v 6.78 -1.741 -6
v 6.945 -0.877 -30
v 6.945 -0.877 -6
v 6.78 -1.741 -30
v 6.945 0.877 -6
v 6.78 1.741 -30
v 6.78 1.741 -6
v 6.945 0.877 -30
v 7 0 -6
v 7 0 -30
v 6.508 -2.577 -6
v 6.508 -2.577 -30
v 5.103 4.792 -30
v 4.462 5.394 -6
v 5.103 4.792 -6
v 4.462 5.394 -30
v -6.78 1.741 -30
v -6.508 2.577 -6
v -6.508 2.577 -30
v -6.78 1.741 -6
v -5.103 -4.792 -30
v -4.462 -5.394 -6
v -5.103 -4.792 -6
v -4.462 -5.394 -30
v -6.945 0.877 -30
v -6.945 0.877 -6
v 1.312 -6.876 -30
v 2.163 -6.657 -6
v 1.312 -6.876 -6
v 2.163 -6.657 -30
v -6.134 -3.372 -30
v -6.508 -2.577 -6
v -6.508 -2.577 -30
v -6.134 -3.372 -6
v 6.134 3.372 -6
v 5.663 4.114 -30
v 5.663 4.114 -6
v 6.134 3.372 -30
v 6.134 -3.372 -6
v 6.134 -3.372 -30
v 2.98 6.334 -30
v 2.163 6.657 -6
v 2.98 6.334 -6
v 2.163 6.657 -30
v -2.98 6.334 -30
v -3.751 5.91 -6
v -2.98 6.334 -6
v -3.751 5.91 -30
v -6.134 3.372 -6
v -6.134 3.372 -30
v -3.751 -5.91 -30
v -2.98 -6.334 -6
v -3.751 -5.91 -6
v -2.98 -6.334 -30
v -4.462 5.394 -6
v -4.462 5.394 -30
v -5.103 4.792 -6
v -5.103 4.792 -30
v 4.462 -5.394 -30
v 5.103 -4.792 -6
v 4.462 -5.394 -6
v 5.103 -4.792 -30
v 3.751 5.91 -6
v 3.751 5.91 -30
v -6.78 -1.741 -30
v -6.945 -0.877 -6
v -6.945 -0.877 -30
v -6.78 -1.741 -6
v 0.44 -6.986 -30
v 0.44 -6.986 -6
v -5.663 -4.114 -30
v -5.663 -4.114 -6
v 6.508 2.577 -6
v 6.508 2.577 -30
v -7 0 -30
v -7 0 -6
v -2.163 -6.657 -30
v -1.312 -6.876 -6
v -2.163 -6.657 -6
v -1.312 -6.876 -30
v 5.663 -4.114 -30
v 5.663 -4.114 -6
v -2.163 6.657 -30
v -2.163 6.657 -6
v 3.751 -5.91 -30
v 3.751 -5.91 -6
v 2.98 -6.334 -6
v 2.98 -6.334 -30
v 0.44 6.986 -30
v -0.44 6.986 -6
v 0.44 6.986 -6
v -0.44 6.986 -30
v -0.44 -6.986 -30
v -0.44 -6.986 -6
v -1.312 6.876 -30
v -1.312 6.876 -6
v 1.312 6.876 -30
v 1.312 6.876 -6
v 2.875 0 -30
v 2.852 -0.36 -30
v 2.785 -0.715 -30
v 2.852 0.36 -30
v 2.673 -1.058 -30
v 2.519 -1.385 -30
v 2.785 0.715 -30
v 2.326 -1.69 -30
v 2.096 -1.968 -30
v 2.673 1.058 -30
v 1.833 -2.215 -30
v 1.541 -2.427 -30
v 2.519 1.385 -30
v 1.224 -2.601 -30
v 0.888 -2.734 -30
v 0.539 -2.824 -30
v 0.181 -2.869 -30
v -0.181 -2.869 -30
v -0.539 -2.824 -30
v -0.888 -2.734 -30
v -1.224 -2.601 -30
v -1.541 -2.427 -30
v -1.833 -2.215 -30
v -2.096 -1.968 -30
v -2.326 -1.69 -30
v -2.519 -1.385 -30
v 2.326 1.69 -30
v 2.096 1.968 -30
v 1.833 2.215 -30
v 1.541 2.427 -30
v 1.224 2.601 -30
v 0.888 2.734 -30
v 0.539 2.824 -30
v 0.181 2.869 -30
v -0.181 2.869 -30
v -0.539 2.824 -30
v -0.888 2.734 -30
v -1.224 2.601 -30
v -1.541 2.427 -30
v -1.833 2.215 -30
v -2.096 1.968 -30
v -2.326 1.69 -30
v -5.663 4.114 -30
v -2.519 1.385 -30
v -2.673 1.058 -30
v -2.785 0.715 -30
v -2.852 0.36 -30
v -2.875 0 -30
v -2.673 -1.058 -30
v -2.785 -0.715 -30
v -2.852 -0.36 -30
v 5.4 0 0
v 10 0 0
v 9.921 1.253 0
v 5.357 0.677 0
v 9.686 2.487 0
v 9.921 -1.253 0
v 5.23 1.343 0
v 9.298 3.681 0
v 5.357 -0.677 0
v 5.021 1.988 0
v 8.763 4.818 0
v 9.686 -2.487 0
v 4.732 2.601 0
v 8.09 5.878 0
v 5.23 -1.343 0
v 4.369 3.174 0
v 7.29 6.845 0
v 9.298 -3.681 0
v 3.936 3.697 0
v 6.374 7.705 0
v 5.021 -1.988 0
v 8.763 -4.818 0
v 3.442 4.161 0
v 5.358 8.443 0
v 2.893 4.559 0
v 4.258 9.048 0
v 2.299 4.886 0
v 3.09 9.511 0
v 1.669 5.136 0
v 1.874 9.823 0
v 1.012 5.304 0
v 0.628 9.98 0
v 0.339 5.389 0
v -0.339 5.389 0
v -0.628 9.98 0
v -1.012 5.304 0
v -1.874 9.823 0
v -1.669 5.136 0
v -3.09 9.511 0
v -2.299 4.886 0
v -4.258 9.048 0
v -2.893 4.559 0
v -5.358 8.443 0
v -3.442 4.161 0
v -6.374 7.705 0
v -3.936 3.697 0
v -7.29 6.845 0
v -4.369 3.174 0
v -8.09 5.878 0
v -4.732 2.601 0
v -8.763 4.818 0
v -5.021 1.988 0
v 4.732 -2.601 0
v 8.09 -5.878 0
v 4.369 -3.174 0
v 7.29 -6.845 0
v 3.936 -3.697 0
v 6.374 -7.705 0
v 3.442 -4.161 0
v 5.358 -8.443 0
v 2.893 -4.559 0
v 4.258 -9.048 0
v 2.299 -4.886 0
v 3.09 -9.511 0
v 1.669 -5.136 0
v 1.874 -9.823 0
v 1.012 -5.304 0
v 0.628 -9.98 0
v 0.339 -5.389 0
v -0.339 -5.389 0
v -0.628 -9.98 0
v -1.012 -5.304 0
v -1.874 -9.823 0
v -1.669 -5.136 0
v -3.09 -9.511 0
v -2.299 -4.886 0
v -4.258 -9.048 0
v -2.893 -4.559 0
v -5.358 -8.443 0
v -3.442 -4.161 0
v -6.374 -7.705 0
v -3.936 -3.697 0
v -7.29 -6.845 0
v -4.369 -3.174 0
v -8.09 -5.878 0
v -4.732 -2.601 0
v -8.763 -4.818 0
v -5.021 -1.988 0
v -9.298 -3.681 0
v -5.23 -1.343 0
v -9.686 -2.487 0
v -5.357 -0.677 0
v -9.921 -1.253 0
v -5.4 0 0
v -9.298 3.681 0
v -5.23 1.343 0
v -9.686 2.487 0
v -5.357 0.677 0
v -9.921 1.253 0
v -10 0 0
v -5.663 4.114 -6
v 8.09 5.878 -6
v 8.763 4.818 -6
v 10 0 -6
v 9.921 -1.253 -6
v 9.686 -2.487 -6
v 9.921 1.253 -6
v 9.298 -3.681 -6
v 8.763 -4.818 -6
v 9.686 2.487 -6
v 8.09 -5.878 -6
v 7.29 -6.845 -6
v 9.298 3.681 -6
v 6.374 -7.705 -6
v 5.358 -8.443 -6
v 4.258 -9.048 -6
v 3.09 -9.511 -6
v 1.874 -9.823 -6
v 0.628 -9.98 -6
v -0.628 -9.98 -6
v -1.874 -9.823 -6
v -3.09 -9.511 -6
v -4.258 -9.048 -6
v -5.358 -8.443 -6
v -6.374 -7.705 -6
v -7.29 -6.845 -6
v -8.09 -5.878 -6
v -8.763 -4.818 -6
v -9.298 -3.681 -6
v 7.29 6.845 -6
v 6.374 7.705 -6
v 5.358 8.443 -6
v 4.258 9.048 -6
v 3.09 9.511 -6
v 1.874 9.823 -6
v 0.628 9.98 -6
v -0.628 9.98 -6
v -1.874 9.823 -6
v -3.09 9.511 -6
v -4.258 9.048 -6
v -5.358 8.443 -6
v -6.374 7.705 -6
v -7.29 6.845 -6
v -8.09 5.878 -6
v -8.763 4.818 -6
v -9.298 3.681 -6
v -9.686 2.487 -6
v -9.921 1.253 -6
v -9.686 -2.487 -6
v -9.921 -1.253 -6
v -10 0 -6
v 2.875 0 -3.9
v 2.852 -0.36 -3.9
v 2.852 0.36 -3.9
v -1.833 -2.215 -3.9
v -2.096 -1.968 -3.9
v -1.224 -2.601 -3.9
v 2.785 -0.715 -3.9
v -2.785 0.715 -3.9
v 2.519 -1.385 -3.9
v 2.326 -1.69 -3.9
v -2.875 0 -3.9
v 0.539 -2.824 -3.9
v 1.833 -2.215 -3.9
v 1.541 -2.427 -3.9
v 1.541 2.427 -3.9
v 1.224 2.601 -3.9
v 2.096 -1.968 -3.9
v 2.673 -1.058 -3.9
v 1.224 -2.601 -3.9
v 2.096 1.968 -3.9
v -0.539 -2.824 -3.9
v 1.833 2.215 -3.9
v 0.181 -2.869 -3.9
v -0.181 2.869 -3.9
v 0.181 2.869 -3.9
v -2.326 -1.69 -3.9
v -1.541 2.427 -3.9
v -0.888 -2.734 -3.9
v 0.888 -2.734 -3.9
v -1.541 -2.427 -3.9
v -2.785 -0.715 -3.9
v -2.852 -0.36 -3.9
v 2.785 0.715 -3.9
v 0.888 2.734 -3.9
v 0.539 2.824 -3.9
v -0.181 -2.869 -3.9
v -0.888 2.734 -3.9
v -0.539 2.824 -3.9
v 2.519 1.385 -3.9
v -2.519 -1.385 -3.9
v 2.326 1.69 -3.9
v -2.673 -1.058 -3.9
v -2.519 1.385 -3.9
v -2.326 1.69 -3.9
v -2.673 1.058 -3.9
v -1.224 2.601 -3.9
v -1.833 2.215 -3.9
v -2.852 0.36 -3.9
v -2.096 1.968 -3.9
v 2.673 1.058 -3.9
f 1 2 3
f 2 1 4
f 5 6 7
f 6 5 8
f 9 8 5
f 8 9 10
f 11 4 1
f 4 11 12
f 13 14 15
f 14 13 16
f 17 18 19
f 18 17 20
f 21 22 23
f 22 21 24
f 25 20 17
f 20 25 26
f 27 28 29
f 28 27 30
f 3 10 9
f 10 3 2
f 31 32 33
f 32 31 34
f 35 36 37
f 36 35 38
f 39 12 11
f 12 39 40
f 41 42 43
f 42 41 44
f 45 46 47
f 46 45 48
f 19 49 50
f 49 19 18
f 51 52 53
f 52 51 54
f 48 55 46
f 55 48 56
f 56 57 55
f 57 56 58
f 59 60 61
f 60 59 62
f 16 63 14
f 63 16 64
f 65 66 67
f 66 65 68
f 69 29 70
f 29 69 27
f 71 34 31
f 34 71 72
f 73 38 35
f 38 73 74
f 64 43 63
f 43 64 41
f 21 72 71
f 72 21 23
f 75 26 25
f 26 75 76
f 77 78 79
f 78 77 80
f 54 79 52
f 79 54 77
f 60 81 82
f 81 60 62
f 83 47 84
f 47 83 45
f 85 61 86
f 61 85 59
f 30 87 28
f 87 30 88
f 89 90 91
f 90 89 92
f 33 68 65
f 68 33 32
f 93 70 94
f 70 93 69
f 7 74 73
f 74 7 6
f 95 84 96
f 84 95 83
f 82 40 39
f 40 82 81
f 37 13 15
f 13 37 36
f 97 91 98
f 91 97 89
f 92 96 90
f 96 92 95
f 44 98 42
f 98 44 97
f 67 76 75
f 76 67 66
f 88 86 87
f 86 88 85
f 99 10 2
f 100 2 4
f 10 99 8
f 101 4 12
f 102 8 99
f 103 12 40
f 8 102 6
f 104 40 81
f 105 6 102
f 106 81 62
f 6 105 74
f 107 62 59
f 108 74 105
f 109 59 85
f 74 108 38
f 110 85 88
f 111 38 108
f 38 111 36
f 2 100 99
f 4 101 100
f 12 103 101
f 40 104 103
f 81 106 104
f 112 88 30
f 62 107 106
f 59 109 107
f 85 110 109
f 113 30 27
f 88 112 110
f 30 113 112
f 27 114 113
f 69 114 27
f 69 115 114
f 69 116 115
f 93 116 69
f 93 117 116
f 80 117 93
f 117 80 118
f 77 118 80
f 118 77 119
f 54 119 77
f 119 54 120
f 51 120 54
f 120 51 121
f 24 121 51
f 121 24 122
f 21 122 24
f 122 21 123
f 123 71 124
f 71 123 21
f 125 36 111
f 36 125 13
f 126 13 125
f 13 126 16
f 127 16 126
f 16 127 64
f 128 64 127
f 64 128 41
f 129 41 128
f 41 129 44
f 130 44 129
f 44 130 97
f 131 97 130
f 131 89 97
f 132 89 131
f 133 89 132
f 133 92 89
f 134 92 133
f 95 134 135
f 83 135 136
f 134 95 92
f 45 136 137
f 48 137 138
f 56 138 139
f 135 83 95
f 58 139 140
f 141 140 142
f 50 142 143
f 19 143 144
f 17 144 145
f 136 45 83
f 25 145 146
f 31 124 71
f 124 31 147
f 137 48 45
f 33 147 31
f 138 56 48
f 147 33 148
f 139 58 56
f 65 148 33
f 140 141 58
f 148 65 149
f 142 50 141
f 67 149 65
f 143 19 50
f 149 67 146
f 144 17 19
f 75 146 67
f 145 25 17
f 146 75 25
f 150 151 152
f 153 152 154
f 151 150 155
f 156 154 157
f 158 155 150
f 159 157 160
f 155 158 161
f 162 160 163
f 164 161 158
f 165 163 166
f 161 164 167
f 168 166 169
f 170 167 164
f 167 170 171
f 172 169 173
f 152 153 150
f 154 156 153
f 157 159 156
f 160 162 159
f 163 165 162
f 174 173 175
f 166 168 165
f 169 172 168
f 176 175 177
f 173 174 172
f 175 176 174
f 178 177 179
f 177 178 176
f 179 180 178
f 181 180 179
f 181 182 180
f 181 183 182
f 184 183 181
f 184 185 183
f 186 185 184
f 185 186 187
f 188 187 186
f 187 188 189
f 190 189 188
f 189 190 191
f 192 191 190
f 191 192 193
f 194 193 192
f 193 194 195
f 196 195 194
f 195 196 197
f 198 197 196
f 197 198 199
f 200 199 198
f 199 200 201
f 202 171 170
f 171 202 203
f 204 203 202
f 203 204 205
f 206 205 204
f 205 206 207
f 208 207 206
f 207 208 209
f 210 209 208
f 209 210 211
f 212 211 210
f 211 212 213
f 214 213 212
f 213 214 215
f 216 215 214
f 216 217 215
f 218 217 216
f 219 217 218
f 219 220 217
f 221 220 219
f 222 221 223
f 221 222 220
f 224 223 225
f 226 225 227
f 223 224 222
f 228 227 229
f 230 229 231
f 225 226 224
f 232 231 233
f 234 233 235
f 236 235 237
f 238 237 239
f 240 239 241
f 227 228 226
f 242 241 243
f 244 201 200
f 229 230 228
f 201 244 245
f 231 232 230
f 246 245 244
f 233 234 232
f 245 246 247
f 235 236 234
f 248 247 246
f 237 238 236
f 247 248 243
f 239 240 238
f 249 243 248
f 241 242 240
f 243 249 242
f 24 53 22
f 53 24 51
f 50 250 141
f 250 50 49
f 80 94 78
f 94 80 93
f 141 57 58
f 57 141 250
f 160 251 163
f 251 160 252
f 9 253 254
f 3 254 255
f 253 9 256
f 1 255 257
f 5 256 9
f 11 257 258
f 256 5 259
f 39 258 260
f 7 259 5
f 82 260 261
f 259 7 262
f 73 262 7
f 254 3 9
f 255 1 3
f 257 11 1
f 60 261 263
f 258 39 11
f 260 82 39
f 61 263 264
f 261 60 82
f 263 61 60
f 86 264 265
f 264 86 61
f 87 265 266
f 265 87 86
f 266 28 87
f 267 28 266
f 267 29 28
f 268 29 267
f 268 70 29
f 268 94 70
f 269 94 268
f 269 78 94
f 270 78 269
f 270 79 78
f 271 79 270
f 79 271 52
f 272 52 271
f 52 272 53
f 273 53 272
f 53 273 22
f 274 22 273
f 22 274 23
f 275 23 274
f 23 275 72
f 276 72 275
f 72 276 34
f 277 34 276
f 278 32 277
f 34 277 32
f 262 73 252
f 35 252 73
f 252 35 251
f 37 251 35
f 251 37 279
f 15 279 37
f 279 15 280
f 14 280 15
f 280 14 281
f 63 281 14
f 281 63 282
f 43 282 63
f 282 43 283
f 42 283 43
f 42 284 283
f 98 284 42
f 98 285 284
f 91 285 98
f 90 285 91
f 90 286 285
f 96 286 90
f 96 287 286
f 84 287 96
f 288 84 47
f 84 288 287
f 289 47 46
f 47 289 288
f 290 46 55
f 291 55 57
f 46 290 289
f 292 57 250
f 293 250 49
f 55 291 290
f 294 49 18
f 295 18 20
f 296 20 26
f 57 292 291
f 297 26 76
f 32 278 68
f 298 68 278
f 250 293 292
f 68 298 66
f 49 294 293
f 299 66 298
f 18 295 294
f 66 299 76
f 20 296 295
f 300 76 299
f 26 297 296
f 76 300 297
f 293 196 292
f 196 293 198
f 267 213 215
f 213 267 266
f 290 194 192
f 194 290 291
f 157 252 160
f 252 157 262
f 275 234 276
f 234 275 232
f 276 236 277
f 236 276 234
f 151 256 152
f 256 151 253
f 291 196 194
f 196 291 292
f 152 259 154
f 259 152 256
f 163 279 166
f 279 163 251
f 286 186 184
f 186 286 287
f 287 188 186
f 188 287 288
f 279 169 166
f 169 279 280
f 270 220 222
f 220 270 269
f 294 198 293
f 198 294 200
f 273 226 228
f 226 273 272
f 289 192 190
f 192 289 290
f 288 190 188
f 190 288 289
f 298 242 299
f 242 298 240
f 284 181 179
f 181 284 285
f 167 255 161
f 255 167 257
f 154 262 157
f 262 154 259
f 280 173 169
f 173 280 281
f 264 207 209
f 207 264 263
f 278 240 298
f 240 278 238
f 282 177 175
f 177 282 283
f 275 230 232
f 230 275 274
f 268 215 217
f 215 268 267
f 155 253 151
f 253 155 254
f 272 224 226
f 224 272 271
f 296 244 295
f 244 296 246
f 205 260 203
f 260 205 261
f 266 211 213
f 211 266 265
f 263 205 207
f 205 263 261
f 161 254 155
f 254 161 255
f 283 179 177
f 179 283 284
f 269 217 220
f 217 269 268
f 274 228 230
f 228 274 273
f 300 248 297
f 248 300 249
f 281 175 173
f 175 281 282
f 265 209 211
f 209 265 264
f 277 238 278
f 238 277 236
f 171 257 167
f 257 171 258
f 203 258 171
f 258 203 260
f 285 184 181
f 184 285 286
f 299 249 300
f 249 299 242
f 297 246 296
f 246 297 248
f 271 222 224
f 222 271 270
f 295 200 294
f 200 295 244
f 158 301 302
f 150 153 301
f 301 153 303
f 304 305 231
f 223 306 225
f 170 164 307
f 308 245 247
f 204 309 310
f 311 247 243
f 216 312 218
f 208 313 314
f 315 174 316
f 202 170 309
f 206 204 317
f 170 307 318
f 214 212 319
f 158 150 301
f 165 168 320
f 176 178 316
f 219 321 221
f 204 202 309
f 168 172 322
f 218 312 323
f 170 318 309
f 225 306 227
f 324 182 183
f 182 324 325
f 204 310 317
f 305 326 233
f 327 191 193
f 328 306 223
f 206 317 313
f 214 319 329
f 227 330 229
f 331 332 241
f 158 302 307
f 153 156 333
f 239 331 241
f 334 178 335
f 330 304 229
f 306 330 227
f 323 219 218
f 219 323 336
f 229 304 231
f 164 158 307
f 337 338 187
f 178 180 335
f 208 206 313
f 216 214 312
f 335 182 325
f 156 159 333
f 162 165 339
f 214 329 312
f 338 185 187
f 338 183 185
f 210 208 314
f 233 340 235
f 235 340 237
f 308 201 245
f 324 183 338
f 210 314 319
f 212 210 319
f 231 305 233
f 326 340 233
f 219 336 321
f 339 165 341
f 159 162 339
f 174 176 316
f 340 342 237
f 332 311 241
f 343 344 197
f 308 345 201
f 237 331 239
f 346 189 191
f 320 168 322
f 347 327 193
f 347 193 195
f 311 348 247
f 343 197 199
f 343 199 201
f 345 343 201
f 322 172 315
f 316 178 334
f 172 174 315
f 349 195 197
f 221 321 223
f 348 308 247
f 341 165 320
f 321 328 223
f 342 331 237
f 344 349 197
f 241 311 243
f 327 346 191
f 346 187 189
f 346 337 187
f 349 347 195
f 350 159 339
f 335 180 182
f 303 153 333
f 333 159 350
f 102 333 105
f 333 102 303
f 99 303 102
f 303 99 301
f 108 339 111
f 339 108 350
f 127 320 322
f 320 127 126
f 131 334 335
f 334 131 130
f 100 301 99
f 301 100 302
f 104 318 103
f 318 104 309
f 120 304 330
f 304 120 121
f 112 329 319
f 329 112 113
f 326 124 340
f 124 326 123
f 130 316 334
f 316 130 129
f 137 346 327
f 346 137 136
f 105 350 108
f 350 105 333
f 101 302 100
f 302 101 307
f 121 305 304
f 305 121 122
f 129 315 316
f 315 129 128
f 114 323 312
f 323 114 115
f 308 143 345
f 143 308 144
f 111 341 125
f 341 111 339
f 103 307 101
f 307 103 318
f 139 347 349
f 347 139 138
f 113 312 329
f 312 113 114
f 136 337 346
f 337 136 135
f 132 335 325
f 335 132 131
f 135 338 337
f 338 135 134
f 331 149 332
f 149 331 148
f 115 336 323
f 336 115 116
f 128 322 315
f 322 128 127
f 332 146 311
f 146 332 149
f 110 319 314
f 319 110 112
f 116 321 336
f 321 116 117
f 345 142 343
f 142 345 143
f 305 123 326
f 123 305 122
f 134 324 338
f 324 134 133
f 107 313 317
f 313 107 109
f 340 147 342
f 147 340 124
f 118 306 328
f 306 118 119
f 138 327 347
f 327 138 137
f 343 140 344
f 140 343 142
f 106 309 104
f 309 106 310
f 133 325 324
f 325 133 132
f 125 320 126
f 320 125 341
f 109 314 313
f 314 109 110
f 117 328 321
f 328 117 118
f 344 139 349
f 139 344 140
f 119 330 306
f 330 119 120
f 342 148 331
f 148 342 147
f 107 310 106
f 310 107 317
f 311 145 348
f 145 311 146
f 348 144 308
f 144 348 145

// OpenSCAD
$fn = 50;


difference() {
	union() {
		translate(v = [0, 0, -30.0000000000]) {
			cylinder(h = 30, r = 7.0000000000);
		}
		translate(v = [0, 0, -6.0000000000]) {
			cylinder(h = 6, r = 10.0000000000);
		}
	}
	union() {
		translate(v = [0, 0, 0]) {
			rotate(a = [0, 0, 0]) {
				difference() {
					union() {
						#translate(v = [0, 0, -30.0000000000]) {
							cylinder(h = 30, r = 2.6000000000);
						}
						#translate(v = [0, 0, -3.9000000000]) {
							cylinder(h = 3.9000000000, r1 = 2.8750000000, r2 = 5.4000000000);
						}
						#translate(v = [0, 0, -30.0000000000]) {
							cylinder(h = 30, r = 2.8750000000);
						}
						#translate(v = [0, 0, -30.0000000000]) {
							cylinder(h = 30, r = 2.6000000000);
						}
					}
					union();
				}
			}
		}
	}
}
